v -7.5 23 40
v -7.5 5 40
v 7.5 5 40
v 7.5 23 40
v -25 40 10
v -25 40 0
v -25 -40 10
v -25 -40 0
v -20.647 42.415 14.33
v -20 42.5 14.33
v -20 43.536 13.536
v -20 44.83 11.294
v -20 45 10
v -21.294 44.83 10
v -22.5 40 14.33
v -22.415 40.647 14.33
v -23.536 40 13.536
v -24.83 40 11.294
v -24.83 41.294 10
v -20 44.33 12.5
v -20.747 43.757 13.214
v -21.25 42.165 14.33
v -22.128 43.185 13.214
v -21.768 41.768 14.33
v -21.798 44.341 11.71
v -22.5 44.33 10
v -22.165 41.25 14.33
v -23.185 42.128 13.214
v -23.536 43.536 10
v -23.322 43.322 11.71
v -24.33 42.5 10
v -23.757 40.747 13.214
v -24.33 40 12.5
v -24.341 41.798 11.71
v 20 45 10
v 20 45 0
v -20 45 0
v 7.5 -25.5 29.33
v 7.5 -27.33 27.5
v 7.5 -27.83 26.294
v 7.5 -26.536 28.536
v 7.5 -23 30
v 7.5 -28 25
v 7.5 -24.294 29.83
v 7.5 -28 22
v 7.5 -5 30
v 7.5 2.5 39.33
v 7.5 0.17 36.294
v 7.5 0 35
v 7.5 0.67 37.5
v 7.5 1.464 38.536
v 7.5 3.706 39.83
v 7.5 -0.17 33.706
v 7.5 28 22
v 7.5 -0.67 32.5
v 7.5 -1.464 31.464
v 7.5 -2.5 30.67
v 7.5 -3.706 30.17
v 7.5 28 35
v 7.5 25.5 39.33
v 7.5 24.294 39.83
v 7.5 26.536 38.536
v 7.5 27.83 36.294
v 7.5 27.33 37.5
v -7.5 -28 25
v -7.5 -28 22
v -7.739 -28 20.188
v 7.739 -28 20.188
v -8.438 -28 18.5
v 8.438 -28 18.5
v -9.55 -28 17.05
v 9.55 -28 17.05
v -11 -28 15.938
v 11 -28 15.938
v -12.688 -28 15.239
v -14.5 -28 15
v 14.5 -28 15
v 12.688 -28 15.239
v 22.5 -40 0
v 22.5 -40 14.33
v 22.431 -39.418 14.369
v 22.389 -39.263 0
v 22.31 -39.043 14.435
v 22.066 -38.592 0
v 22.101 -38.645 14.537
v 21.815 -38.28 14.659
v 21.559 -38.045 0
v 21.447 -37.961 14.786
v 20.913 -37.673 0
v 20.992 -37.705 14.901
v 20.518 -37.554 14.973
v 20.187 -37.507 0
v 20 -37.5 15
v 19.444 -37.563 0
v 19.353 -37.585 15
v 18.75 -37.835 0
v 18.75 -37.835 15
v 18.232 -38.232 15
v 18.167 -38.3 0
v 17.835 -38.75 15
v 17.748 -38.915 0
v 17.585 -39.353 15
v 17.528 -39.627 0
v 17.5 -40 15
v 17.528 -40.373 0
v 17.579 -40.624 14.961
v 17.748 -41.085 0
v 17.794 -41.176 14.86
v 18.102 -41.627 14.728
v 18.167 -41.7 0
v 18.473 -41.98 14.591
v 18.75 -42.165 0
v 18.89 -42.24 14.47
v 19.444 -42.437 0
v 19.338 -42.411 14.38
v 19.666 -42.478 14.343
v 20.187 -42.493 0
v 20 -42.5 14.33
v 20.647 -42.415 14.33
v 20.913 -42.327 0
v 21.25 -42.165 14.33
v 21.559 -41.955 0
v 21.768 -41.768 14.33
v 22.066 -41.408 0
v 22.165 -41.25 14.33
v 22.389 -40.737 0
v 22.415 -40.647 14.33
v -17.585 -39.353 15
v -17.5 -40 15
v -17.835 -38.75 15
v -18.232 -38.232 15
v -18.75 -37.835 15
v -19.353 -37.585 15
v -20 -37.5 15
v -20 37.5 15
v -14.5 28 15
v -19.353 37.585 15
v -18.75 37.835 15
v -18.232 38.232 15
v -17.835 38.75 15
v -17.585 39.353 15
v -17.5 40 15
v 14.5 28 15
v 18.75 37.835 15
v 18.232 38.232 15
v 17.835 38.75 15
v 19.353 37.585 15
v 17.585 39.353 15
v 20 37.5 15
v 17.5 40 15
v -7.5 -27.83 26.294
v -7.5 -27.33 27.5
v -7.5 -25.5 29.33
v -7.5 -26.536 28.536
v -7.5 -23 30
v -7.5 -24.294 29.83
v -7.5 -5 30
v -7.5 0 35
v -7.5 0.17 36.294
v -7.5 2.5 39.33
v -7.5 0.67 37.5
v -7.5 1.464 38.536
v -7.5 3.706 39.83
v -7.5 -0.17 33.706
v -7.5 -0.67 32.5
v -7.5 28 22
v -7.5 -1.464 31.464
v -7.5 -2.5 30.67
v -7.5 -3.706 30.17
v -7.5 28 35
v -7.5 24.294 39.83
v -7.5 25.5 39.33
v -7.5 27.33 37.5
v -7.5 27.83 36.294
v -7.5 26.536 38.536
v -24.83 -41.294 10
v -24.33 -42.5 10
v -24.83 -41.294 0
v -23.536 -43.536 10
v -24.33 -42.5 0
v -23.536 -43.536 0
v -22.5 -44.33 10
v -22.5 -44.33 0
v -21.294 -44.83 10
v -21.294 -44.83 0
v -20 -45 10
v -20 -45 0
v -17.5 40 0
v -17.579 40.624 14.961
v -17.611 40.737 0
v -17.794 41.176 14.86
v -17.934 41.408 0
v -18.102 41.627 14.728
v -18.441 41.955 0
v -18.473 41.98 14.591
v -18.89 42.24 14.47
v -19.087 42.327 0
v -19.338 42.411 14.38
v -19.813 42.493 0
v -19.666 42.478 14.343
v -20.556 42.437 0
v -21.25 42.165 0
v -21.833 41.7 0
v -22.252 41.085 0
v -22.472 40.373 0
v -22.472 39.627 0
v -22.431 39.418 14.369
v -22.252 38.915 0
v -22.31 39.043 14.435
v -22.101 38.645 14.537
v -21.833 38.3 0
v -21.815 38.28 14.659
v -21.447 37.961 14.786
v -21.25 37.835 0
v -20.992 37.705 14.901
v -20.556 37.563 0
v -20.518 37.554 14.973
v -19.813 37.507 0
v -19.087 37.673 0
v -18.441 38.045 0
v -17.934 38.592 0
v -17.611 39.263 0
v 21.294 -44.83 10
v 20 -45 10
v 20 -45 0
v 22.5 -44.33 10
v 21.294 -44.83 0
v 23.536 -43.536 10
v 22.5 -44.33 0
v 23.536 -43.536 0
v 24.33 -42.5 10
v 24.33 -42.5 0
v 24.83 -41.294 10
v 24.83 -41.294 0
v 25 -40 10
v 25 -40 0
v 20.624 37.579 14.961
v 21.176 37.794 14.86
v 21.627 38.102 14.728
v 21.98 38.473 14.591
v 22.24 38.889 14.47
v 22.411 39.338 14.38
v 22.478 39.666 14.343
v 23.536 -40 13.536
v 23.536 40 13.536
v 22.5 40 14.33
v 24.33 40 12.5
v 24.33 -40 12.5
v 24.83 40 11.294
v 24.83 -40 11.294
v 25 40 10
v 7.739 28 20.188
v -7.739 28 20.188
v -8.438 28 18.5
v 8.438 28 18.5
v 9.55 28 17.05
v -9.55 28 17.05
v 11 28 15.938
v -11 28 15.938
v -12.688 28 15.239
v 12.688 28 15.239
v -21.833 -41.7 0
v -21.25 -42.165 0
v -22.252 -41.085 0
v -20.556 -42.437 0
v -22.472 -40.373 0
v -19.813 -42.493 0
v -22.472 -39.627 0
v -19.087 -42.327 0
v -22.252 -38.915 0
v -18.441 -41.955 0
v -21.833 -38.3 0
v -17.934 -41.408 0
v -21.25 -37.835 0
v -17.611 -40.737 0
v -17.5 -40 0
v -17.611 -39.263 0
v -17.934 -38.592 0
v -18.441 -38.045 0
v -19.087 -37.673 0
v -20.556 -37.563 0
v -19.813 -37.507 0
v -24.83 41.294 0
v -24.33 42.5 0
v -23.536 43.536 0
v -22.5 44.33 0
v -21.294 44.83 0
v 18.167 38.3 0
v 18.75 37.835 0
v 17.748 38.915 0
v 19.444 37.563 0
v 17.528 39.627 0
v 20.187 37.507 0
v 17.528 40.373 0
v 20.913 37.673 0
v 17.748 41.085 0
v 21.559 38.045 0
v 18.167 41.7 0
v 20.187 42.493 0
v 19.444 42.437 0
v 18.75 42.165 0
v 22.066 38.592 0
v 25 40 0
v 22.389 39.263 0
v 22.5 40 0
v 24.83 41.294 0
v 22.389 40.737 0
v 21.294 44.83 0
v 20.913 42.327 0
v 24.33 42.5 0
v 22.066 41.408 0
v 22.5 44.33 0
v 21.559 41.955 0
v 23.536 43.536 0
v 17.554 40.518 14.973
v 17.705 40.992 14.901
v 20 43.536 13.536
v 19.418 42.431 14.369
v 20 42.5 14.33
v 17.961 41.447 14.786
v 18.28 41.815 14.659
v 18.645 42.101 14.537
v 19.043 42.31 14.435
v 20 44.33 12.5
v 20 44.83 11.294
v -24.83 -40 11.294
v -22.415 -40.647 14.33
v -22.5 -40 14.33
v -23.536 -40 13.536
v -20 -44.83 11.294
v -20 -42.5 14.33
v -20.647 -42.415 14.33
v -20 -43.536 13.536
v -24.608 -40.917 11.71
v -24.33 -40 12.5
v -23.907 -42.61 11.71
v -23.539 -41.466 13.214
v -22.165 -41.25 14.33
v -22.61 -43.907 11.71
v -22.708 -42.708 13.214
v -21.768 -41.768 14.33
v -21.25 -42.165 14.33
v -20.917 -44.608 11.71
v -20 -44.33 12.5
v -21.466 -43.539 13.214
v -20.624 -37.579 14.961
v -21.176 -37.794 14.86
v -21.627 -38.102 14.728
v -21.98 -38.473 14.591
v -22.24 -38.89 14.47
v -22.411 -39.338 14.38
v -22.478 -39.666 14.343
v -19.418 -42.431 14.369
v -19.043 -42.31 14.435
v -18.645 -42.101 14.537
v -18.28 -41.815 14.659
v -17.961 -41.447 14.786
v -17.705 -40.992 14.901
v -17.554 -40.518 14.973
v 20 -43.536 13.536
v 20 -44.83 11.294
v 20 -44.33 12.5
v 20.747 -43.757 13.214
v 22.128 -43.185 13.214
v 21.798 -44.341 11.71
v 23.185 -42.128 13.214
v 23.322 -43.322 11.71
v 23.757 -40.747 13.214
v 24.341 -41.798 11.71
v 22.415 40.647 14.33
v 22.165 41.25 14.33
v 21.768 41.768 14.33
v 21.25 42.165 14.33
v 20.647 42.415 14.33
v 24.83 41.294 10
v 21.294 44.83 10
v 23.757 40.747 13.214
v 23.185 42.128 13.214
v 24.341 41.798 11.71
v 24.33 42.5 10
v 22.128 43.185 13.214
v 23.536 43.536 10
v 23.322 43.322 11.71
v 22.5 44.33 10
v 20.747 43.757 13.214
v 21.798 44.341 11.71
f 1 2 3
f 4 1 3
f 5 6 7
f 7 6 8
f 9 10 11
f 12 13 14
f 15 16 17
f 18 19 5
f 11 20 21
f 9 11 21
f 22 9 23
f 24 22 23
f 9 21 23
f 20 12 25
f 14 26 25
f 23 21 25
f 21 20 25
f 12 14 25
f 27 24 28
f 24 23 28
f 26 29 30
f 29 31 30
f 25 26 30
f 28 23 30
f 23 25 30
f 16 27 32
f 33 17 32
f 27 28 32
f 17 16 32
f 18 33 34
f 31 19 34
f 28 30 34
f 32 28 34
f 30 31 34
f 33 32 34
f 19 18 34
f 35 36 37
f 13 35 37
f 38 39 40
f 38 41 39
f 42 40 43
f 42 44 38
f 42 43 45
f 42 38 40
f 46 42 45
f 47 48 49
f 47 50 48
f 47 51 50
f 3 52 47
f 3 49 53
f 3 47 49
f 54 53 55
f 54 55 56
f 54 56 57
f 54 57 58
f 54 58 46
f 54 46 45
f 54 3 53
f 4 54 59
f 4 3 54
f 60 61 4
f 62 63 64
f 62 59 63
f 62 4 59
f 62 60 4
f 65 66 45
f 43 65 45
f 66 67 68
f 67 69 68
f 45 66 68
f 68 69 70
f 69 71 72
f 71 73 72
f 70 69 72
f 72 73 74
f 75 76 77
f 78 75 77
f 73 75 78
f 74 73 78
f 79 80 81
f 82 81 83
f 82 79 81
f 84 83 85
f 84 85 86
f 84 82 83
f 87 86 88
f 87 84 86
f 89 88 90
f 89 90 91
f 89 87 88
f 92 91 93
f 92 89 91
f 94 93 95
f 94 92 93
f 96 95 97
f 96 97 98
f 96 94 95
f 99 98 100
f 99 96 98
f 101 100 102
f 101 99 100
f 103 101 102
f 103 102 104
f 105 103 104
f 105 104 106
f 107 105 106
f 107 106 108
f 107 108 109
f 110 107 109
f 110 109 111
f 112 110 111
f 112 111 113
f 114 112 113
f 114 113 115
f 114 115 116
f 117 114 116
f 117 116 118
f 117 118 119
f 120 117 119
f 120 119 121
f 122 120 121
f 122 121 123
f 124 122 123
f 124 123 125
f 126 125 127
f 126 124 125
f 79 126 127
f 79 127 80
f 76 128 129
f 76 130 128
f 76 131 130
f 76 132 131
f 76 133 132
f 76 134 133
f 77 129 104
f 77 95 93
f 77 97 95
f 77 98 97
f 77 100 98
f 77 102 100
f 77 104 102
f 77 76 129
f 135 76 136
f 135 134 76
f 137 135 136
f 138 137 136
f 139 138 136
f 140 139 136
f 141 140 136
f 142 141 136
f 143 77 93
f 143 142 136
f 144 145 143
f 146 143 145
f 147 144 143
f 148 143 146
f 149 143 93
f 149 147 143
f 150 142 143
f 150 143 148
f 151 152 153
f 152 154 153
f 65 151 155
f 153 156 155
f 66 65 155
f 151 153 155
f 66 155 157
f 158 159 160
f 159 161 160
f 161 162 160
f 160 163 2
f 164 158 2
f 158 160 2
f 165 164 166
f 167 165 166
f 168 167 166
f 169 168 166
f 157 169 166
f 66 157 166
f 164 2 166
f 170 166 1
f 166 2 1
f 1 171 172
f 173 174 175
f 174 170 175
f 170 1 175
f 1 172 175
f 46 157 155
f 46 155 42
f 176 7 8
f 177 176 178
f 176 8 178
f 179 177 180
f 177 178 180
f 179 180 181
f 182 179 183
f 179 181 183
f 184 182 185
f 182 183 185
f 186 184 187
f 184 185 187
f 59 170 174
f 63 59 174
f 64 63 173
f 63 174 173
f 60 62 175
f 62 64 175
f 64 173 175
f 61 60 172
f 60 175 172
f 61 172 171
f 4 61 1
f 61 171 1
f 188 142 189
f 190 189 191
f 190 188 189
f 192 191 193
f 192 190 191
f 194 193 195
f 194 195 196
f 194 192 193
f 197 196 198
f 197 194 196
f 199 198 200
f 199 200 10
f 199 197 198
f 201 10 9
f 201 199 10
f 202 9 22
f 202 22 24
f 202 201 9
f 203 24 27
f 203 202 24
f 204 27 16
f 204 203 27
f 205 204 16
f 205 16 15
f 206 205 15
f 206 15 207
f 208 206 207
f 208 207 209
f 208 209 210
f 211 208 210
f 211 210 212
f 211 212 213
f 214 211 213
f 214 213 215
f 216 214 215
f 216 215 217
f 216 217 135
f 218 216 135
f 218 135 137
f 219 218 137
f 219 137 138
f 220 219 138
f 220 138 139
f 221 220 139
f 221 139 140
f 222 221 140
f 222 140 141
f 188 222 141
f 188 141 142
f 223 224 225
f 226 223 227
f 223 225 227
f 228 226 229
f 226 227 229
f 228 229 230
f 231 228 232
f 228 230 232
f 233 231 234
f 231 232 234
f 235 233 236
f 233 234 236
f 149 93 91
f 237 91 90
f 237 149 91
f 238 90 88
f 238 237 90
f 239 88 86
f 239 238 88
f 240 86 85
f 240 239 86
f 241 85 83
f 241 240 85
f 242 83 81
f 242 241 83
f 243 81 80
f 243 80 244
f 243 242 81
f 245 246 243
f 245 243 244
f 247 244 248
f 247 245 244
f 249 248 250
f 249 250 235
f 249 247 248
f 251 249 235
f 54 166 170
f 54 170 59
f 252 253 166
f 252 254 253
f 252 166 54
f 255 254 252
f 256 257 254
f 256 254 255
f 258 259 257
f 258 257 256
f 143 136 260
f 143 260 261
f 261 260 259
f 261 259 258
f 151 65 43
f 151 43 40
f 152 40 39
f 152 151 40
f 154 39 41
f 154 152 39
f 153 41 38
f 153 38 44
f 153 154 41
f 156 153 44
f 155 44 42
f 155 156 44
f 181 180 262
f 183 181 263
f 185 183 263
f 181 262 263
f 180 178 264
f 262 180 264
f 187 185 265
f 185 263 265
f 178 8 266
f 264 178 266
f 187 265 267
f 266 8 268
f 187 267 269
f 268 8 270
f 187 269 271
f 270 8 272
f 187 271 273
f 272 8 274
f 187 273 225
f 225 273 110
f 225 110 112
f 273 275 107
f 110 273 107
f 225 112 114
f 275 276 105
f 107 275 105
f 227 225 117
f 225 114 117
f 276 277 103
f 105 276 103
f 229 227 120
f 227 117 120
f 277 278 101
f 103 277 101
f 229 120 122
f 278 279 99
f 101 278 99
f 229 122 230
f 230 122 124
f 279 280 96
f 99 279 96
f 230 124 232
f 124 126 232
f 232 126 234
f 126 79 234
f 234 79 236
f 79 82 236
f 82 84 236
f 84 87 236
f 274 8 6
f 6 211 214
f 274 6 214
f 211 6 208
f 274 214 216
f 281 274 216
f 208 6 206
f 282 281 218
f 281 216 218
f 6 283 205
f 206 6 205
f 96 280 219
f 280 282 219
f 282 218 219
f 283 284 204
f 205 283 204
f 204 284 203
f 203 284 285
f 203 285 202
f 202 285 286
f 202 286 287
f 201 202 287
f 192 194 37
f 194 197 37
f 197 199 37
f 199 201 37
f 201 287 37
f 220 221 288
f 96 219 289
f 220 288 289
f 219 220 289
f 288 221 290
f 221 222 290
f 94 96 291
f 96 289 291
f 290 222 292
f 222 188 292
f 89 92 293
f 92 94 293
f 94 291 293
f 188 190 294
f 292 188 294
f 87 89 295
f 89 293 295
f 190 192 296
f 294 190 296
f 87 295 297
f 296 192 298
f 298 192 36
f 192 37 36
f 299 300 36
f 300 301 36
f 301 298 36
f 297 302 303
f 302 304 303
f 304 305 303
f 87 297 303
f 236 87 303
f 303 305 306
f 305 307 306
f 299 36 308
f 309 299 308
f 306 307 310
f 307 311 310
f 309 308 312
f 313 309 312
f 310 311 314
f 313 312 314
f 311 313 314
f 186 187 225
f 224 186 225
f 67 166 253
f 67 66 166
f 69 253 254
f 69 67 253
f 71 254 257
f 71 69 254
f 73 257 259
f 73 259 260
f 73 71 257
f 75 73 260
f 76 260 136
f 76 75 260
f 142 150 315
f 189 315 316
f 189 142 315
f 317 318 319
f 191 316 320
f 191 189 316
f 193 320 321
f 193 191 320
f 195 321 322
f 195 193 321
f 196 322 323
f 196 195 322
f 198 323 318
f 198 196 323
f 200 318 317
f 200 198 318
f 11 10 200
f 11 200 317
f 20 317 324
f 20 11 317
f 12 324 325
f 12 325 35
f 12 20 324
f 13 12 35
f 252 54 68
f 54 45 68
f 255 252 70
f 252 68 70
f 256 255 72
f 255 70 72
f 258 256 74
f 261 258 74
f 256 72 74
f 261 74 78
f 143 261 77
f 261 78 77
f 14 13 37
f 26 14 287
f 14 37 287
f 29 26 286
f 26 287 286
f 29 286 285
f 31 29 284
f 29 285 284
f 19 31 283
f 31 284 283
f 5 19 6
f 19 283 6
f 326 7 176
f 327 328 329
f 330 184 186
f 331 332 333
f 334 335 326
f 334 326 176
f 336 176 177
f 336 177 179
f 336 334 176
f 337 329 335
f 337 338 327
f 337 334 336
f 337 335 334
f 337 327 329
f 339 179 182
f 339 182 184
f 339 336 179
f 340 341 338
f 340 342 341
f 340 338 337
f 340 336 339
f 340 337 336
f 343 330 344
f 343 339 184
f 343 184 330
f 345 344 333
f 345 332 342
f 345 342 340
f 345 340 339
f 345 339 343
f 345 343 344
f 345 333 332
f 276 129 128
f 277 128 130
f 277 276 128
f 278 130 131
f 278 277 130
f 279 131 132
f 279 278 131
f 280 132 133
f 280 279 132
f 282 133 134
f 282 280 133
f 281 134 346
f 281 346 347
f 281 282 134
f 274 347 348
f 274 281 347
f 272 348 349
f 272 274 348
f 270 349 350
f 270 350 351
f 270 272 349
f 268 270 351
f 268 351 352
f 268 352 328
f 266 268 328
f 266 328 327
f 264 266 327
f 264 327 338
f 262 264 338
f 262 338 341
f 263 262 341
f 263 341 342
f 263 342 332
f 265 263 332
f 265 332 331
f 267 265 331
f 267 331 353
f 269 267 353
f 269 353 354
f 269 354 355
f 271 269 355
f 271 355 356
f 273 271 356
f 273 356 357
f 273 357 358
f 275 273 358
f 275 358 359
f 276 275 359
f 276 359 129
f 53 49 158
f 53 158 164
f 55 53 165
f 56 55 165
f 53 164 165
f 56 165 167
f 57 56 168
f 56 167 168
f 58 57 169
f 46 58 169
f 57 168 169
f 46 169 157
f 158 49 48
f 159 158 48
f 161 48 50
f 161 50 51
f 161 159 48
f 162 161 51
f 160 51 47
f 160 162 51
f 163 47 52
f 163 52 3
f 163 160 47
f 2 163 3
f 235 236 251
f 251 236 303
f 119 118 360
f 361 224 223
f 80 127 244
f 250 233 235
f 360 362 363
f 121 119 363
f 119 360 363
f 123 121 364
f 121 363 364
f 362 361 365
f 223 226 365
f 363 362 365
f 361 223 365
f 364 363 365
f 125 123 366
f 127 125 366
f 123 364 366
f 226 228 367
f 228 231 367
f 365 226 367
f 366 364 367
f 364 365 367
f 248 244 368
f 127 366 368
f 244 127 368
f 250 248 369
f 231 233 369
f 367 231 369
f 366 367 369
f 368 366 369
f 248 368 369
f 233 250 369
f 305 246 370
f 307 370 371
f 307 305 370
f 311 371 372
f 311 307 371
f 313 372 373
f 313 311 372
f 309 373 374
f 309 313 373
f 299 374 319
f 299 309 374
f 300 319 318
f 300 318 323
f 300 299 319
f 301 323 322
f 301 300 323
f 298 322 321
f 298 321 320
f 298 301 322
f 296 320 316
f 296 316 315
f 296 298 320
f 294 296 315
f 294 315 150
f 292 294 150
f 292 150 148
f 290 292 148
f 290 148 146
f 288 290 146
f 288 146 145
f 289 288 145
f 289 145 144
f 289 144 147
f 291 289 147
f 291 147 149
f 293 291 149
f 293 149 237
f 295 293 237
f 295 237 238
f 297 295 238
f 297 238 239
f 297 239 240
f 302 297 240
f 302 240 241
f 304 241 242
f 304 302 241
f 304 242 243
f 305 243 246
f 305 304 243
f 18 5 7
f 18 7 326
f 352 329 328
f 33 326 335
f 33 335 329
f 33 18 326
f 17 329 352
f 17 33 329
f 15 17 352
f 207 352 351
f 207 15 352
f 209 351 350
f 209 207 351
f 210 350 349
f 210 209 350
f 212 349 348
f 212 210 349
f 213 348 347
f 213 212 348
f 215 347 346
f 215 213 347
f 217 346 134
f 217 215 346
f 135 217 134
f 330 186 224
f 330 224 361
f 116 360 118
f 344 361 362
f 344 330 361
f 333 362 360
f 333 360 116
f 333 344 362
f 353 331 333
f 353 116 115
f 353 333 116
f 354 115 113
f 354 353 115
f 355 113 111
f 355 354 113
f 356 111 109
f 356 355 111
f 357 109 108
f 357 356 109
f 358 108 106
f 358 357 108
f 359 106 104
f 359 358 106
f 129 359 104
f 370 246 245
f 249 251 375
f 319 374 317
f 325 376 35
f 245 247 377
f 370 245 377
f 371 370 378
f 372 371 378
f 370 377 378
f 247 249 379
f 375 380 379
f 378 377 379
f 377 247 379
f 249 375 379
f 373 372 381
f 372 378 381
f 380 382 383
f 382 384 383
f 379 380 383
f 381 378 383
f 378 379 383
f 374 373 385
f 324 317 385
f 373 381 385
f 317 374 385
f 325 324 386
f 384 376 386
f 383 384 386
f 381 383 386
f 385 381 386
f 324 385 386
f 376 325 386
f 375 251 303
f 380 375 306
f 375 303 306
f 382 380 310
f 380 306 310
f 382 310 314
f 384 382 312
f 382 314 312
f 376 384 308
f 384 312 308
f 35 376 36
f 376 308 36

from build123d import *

# Parameters (mm, degrees)
F0_R         = 2.5
F1_DEPTH     = 15
F0_W         = 15
F0_H         = 28
F2_DEPTH     = 40
F3_DEPTH     = 30
F4_T1_DEPTH  = 15
F4_T3_DEPTH  = 40
F4_T5_DEPTH  = 80
F4_T8_ANGLE  = 90
F4_T10_ANGLE = 90
F4_T12_ANGLE = 90
F4_T14_ANGLE = 90
F5_R         = 7


# Not quite as in the source:
# - a fillet or chamfer that OpenCascade refuses, or shapes differently, is made with other operations: its cross-section is extruded or revolved along the edge and cut away or added


with BuildPart() as f1:
    # F0 (on Top) → F1 (new body)
    with BuildSketch(Plane.XY):
        with BuildLine():
            ThreePointArc((-25, -40), (-23.5355339059, -43.5355339059), (-20, -45))
            Line((-20, -45), (20, -45))
            ThreePointArc((20, -45), (23.5355339059, -43.5355339059), (25, -40))
            Line((25, -40), (25, 40))
            ThreePointArc((25, 40), (23.5355339059, 43.5355339059), (20, 45))
            Line((20, 45), (-20, 45))
            ThreePointArc((-20, 45), (-23.5355339059, 43.5355339059), (-25, 40))
            Line((-25, 40), (-25, -40))
        make_face()
        with Locations((-20, -40)):
            Circle(F0_R, mode=Mode.SUBTRACT)
        with Locations((20, -40)):
            Circle(F0_R, mode=Mode.SUBTRACT)
        with Locations((-20, 40)):
            Circle(F0_R, mode=Mode.SUBTRACT)
        Polygon((7.5, 28), (7.5, 0), (7.5, -28), (-7.5, -28), (-7.5, 0), (-7.5, 28), align=None, mode=Mode.SUBTRACT)
        with Locations((20, 40)):
            Circle(F0_R, mode=Mode.SUBTRACT)
    extrude(amount=F1_DEPTH)

    # F0 (on Top) → F2 (join)
    with BuildSketch(Plane.XY):
        with Locations((0, 14)):
            Rectangle(F0_W, F0_H)
    extrude(amount=F2_DEPTH)

    # F0 (on Top) → F3 (join)
    with BuildSketch(Plane.XY):
        with Locations((0, -14)):
            Rectangle(F0_W, F0_H)
    extrude(amount=F3_DEPTH)

    # F4: fillet of radius 5 on 6 edges, made by hand

    # F4_s2 → F4_t1 (join)
    with BuildSketch(Plane.YZ.offset(-7.5)):
        with BuildLine():
            ThreePointArc((0, 35), (-1.4644660941, 31.4644660941), (-5, 30))
            Line((-5, 30), (0, 30))
            Line((0, 30), (0, 35))
        make_face()
    extrude(amount=F4_T1_DEPTH)

    # F4_s4 → F4_t3 (cut)
    with BuildSketch(Plane.YZ.offset(-20)):
        with BuildLine():
            ThreePointArc((0, 35), (1.4644660941, 38.5355339059), (5, 40))
            Line((5, 40), (0, 40))
            Line((0, 40), (0, 35))
        make_face()
        with BuildLine():
            ThreePointArc((28, 35), (26.5355339059, 38.5355339059), (23, 40))
            Line((23, 40), (28, 40))
            Line((28, 40), (28, 35))
        make_face()
        with BuildLine():
            ThreePointArc((-45, 10), (-43.5355339059, 13.5355339059), (-40, 15))
            Line((-40, 15), (-45, 15))
            Line((-45, 15), (-45, 10))
        make_face()
        with BuildLine():
            ThreePointArc((-28, 25), (-26.5355339059, 28.5355339059), (-23, 30))
            Line((-23, 30), (-28, 30))
            Line((-28, 30), (-28, 25))
        make_face()
        with BuildLine():
            ThreePointArc((40, 15), (43.5355339059, 13.5355339059), (45, 10))
            Line((45, 10), (45, 15))
            Line((45, 15), (40, 15))
        make_face()
    extrude(amount=F4_T3_DEPTH, mode=Mode.SUBTRACT)

    # F4_s6 → F4_t5 (cut)
    with BuildSketch(Plane.XZ.offset(-40)):
        with BuildLine():
            ThreePointArc((-25, 10), (-23.5355339059, 13.5355339059), (-20, 15))
            Line((-20, 15), (-25, 15))
            Line((-25, 15), (-25, 10))
        make_face()
        with BuildLine():
            ThreePointArc((20, 15), (23.5355339059, 13.5355339059), (25, 10))
            Line((25, 10), (25, 15))
            Line((25, 15), (20, 15))
        make_face()
    extrude(amount=F4_T5_DEPTH, mode=Mode.SUBTRACT)

    # F4_s7 → F4_t8 (revolve, cut)
    with BuildSketch(Plane.XZ.offset(40)):
        with BuildLine():
            ThreePointArc((-25, 10), (-23.5355339059, 13.5355339059), (-20, 15))
            Line((-20, 15), (-25, 15))
            Line((-25, 15), (-25, 10))
        make_face()
    revolve(axis=Axis((-20, -40, 15), (0, 0, 1)), revolution_arc=F4_T8_ANGLE, mode=Mode.SUBTRACT)

    # F4_s9 → F4_t10 (revolve, cut)
    with BuildSketch(Plane.YZ.offset(-20)):
        with BuildLine():
            ThreePointArc((40, 15), (43.5355339059, 13.5355339059), (45, 10))
            Line((45, 10), (45, 15))
            Line((45, 15), (40, 15))
        make_face()
    revolve(axis=Axis((-20, 40, 15), (0, 0, 1)), revolution_arc=F4_T10_ANGLE, mode=Mode.SUBTRACT)

    # F4_s11 → F4_t12 (revolve, cut)
    with BuildSketch(Plane.XZ.offset(-40)):
        with BuildLine():
            ThreePointArc((20, 15), (23.5355339059, 13.5355339059), (25, 10))
            Line((25, 10), (25, 15))
            Line((25, 15), (20, 15))
        make_face()
    revolve(axis=Axis((20, 40, 15), (0, 0, 1)), revolution_arc=F4_T12_ANGLE, mode=Mode.SUBTRACT)

    # F4_s13 → F4_t14 (revolve, cut)
    with BuildSketch(Plane.YZ.offset(20)):
        with BuildLine():
            ThreePointArc((-40, 15), (-43.5355339059, 13.5355339059), (-45, 10))
            Line((-45, 10), (-45, 15))
            Line((-45, 15), (-40, 15))
        make_face()
    revolve(axis=Axis((20, -40, 15), (0, 0, 1)), revolution_arc=F4_T14_ANGLE, mode=Mode.SUBTRACT)

    # F5
    f5_edges = [f1.edges().sort_by_distance(p)[0] for p in [
        (-7.5, 0, 15),
        (7.5, 0, 15),
    ]]
    fillet(f5_edges, radius=F5_R)


solid = f1.part
